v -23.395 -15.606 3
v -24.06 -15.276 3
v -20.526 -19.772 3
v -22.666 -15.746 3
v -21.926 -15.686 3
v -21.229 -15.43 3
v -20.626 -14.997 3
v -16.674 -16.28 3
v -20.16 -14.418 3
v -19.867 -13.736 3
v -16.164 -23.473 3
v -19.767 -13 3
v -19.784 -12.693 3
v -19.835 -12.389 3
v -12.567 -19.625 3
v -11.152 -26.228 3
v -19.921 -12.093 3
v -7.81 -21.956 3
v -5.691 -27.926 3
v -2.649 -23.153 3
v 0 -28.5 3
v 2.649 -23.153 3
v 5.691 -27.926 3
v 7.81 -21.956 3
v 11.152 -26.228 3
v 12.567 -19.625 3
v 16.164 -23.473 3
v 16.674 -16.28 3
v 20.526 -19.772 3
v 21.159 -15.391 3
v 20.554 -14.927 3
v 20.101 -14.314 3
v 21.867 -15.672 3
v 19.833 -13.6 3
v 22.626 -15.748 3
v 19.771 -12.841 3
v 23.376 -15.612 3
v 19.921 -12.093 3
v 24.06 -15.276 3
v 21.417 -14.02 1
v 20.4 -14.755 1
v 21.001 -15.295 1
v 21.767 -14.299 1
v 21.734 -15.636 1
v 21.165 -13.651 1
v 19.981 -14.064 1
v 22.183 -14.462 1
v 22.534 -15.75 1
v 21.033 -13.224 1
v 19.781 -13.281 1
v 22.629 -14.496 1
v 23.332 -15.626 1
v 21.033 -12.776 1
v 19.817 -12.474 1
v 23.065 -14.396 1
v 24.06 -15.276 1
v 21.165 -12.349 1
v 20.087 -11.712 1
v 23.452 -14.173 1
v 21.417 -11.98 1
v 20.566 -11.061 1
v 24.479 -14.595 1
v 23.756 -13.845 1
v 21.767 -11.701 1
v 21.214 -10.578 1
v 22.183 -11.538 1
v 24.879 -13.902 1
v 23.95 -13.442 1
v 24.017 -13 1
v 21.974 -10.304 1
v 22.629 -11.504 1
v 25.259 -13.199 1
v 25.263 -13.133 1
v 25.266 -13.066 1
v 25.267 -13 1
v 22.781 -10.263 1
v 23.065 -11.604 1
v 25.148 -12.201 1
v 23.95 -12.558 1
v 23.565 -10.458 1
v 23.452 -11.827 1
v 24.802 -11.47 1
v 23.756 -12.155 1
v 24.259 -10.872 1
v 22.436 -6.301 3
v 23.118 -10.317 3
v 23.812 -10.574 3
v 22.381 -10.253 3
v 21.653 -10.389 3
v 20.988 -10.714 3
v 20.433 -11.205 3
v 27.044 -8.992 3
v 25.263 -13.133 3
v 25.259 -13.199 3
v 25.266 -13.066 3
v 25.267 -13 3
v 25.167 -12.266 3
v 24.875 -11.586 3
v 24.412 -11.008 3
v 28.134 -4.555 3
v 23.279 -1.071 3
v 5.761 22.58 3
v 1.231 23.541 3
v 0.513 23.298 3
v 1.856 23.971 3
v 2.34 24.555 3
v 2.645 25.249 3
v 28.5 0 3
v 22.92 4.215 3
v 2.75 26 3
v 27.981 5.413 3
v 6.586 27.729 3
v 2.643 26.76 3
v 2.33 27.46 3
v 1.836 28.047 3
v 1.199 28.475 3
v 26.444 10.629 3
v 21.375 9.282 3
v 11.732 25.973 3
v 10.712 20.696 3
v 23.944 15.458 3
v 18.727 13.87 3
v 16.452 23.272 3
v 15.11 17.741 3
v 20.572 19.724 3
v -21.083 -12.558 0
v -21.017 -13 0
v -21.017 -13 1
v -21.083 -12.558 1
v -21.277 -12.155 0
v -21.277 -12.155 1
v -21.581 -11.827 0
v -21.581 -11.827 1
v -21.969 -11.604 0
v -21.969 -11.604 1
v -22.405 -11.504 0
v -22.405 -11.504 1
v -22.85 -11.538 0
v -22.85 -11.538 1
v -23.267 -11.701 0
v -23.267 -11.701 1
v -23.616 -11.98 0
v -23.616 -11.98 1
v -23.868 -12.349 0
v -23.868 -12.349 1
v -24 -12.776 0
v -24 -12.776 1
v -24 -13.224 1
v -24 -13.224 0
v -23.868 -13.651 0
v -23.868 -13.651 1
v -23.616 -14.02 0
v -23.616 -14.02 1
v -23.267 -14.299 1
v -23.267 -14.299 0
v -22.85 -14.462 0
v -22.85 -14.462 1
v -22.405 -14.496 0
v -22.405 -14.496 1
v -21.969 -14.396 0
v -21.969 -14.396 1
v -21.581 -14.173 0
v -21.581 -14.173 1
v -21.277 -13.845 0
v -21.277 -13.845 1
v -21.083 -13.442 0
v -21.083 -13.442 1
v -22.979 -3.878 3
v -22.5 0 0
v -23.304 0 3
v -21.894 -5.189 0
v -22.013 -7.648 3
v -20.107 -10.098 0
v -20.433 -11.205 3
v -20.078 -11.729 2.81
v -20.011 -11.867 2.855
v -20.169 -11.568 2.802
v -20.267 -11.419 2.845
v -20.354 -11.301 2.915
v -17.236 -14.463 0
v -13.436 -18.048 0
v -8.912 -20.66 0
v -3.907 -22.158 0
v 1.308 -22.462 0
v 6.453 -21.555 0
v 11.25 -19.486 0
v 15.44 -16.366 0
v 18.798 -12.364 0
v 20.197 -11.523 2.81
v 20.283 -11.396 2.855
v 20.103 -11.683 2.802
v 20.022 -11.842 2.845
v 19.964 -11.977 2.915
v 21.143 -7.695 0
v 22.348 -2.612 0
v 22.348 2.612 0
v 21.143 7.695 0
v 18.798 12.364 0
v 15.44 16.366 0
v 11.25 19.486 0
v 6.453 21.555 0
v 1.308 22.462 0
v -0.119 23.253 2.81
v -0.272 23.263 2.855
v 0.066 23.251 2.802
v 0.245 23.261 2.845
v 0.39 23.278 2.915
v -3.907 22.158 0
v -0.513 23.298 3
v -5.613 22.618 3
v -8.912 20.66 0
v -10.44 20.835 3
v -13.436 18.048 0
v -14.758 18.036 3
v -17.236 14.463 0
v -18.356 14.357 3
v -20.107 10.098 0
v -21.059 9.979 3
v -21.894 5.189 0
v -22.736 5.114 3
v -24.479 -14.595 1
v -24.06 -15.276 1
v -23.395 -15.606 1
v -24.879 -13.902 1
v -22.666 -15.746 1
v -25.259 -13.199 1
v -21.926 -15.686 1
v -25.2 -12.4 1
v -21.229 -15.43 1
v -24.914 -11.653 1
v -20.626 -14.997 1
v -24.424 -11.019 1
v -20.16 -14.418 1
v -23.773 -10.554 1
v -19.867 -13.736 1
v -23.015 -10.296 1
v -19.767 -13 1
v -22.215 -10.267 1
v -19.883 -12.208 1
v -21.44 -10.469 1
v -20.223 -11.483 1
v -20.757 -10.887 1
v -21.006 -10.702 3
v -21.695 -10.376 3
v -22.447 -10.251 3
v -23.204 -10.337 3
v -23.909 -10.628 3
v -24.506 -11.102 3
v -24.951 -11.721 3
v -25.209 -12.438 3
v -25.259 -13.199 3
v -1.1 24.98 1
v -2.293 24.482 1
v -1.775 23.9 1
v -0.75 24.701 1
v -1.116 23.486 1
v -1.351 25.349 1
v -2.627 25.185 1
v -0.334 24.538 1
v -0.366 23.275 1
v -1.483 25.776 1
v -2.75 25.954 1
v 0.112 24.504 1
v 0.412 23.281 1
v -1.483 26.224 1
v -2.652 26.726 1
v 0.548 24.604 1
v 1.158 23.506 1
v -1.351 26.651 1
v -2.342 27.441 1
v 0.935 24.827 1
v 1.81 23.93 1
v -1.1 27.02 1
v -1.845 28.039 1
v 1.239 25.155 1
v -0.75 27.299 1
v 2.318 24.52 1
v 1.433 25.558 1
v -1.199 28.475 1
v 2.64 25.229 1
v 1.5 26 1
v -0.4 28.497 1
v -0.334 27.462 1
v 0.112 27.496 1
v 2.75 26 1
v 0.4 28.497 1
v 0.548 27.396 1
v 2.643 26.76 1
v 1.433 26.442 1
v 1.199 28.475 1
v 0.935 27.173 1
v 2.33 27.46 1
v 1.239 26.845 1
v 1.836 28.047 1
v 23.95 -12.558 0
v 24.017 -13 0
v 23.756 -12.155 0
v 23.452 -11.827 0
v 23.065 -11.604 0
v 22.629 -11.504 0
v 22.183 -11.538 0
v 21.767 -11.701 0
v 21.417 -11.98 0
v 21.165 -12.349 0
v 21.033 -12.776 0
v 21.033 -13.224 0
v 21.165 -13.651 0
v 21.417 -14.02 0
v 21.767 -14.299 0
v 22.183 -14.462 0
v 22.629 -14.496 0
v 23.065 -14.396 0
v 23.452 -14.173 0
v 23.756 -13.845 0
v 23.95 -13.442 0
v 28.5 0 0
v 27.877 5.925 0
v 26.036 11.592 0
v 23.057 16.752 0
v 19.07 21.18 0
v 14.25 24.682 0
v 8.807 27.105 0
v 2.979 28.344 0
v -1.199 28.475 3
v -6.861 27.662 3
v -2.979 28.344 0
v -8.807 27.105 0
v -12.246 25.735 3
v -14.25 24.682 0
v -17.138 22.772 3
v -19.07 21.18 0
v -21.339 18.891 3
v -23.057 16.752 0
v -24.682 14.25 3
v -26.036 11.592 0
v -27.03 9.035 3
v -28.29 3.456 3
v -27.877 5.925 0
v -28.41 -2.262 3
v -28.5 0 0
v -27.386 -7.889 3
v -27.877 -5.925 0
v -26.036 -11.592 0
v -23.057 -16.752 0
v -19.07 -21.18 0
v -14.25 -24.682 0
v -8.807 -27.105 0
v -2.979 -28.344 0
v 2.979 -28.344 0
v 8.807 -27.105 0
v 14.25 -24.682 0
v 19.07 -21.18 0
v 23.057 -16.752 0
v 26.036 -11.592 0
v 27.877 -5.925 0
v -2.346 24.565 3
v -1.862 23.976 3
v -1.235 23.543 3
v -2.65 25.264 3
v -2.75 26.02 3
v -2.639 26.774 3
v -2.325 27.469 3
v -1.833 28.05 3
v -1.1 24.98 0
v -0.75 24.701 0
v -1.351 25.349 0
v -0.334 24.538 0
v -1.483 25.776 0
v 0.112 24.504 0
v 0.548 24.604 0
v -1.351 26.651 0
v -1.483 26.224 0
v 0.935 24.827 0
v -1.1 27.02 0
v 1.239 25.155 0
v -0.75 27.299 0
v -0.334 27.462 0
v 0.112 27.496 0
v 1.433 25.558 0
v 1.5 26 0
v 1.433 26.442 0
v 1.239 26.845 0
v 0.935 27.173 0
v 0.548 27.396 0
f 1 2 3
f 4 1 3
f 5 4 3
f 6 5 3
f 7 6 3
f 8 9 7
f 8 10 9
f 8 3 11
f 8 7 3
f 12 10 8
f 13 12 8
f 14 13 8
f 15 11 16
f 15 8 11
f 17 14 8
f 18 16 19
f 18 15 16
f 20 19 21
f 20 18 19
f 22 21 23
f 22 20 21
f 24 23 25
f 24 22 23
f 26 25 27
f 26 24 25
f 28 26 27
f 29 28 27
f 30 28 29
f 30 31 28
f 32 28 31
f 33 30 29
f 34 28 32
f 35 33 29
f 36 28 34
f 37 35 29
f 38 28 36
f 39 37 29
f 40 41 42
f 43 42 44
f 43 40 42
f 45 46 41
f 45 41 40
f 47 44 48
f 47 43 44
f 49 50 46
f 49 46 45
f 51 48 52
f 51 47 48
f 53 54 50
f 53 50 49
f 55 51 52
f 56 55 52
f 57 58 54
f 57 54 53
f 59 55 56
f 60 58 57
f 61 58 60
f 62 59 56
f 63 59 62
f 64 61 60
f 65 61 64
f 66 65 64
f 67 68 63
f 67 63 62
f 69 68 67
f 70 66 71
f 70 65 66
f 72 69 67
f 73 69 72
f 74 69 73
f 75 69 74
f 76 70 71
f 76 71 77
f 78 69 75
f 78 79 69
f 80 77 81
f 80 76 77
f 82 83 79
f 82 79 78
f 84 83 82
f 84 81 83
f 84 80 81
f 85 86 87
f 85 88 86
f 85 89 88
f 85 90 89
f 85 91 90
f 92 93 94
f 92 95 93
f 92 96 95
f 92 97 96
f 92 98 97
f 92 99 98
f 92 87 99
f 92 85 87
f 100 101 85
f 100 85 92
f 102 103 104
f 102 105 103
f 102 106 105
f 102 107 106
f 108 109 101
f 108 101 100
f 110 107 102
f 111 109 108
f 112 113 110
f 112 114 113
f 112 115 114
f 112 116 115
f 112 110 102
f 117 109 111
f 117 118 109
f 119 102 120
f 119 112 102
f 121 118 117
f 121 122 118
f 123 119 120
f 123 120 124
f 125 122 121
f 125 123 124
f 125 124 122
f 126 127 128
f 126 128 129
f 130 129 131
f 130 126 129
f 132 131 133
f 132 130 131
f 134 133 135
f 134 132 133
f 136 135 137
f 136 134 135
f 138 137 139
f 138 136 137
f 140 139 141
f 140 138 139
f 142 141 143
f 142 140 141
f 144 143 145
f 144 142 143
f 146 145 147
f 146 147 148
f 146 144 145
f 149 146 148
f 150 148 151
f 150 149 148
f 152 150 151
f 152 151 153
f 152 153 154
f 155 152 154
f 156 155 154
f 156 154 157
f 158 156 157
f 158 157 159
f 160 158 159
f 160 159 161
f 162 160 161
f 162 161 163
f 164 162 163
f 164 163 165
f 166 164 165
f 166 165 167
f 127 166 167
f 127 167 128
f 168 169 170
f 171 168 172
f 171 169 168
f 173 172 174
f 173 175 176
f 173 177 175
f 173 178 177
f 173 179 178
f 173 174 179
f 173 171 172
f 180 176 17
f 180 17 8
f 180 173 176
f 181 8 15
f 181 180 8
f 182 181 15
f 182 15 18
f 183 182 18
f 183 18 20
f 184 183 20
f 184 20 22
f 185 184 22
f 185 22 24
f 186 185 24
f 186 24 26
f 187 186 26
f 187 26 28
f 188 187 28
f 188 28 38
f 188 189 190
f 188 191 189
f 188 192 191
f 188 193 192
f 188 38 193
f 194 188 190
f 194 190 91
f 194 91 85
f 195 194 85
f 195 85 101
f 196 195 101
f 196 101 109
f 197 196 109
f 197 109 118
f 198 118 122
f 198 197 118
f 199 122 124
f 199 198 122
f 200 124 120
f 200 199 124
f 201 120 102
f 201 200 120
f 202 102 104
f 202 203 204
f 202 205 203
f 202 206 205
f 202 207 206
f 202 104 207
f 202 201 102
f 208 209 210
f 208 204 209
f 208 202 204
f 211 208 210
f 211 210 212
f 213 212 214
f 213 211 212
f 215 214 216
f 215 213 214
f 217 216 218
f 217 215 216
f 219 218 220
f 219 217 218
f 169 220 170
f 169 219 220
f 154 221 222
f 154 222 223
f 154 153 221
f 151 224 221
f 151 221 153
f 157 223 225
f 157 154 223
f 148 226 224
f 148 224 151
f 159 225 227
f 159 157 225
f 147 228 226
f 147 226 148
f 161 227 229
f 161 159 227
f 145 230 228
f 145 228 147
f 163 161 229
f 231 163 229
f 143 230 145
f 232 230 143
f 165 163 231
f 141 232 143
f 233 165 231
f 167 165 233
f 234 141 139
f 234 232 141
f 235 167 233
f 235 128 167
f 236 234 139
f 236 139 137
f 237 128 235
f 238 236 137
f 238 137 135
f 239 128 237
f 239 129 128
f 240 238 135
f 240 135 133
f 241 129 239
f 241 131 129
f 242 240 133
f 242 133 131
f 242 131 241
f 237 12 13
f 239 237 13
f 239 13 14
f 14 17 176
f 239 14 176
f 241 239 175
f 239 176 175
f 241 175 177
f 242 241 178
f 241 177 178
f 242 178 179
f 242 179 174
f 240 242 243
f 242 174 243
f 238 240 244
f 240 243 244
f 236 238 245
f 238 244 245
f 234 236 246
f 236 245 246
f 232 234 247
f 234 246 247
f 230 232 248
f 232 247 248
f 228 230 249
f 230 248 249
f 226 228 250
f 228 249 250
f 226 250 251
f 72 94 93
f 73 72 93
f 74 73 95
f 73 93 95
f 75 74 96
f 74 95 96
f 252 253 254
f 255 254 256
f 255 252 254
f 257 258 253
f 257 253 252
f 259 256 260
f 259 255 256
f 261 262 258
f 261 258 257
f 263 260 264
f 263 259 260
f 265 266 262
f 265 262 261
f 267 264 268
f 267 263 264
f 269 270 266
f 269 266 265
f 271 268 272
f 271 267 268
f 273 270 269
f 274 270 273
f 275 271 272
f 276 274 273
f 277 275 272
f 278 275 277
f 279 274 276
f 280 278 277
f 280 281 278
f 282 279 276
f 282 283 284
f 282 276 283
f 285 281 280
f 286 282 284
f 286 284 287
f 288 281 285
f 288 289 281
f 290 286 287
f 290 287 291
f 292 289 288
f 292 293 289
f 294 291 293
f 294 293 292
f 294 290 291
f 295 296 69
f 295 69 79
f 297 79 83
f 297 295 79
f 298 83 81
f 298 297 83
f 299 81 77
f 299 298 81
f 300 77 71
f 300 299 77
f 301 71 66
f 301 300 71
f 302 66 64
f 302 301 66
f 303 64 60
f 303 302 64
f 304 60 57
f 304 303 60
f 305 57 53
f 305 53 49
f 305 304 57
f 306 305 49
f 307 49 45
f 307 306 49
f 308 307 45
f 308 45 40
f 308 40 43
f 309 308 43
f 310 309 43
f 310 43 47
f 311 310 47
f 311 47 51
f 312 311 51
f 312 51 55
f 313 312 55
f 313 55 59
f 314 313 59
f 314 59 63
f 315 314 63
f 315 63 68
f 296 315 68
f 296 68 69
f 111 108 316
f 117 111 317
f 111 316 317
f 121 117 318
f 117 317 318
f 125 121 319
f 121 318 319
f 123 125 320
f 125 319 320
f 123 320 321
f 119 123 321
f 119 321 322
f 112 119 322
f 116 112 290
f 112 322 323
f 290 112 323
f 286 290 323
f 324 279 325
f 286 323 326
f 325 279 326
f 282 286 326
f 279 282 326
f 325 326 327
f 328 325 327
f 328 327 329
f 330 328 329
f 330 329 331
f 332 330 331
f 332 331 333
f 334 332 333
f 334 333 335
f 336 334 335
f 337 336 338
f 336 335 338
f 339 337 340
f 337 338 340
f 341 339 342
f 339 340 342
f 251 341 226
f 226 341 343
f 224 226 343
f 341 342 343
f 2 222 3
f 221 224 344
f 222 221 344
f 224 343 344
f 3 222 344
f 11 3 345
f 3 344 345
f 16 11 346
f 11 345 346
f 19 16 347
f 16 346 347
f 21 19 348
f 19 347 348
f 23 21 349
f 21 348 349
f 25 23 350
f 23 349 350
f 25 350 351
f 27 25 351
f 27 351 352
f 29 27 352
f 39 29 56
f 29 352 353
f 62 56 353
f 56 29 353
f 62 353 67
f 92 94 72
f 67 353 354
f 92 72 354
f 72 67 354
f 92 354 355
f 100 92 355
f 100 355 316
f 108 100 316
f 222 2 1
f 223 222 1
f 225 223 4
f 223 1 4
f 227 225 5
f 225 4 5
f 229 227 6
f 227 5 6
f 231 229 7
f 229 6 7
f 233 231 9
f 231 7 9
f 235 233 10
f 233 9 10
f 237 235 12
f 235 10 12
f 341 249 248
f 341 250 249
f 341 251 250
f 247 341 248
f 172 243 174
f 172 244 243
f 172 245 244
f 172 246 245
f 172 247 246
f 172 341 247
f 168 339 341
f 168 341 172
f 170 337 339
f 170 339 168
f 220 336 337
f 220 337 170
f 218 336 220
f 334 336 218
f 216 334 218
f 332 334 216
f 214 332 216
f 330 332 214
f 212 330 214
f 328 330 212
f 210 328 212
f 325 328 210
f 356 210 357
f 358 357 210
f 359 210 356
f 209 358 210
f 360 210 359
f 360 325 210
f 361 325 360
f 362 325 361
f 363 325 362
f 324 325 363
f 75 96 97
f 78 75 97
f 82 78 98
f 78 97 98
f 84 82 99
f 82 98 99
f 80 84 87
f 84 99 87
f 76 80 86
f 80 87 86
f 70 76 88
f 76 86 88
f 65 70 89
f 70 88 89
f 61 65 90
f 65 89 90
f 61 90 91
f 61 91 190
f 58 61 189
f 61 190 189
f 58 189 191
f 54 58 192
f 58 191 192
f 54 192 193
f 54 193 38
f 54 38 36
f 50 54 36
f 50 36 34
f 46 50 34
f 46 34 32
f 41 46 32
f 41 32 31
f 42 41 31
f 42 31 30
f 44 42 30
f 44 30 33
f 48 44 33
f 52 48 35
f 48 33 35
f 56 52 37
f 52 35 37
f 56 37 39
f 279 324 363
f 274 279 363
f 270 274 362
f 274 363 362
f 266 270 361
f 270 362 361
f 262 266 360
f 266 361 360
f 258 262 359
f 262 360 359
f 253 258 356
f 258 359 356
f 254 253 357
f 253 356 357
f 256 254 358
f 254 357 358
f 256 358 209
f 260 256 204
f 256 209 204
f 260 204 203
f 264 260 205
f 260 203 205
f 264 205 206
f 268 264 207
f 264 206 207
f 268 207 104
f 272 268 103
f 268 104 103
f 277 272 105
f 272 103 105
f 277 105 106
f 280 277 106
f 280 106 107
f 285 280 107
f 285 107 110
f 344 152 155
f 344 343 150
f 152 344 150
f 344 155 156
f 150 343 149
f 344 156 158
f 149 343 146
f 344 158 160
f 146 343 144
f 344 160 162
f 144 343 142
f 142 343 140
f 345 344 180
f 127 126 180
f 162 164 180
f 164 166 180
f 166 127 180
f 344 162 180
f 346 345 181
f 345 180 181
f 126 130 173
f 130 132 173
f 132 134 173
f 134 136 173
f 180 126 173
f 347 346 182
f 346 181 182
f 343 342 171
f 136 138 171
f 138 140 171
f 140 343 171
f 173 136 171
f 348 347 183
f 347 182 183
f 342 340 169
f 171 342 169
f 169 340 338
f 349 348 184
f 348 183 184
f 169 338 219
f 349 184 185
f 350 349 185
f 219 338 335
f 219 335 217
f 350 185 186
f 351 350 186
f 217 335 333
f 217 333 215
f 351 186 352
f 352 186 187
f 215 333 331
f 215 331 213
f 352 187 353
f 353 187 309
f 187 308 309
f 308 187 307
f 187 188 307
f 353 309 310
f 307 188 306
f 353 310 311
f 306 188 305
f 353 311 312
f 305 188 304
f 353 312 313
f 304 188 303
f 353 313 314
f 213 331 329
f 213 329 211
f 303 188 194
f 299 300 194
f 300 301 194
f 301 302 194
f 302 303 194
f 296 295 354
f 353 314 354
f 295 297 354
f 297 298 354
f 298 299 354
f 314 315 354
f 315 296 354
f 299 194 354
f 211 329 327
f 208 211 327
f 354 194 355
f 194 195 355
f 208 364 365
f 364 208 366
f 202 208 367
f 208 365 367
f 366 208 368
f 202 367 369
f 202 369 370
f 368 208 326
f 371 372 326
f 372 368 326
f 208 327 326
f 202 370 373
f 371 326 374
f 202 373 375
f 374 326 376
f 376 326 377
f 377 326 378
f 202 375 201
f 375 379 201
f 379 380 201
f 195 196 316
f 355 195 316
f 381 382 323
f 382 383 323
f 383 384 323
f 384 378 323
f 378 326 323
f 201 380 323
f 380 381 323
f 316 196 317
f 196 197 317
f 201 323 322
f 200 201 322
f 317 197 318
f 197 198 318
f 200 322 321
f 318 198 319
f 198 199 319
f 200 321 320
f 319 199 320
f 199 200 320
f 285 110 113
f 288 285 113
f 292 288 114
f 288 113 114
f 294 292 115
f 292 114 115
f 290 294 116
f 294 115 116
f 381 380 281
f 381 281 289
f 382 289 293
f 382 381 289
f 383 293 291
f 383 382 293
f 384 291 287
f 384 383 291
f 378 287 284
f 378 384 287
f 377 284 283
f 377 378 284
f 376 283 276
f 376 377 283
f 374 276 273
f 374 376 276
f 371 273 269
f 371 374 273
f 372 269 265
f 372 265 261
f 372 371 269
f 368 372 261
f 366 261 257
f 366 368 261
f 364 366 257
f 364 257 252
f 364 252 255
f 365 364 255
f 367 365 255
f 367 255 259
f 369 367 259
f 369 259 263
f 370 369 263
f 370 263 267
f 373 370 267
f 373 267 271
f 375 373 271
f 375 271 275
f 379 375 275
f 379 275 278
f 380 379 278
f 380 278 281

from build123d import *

# Parameters (mm, degrees)
F0_R     = 28.5
F0_R_2   = 1.5
F0_R_3   = 22.5
F1_DEPTH = 3
F2_R     = 1.5
F3_DEPTH = 2


with BuildPart() as f1:
    # F0 (on Top) → F1 (new body)
    with BuildSketch(Plane.XY):
        Circle(F0_R)
        with Locations((-22.5166604984, -13)):
            Circle(F0_R_2, mode=Mode.SUBTRACT)
        with Locations((22.5166604984, -13)):
            Circle(F0_R_2, mode=Mode.SUBTRACT)
        Circle(F0_R_3, mode=Mode.SUBTRACT)
        with Locations((0, 26)):
            Circle(F0_R_2, mode=Mode.SUBTRACT)
    extrude(amount=F1_DEPTH)

    # F2 (on face) → F3 (cut)
    with BuildSketch(Plane.XY.offset(3)):
        with BuildLine():
            ThreePointArc((-1.1991934148, 28.4747596154), (-1.4602599271, 23.6697337179), (2.75, 26))
            ThreePointArc((2.75, 26), (2.3302662821, 27.4602599271), (1.1991934148, 28.4747596154))
            ThreePointArc((1.1991934148, 28.4747596154), (0, 28.5), (-1.1991934148, 28.4747596154))
        make_face()
        with Locations((0, 26)):
            Circle(F2_R, mode=Mode.SUBTRACT)
        with BuildLine():
            ThreePointArc((-19.7666604984, -13), (-22.6161495504, -10.2518002386), (-25.259461901, -13.1988478464))
            ThreePointArc((-25.259461901, -13.1988478464), (-24.6817240079, -14.25), (-24.0602684862, -15.2759117689))
            ThreePointArc((-24.0602684862, -15.2759117689), (-21.2287206641, -15.429755334), (-19.7666604984, -13))
        make_face()
        with Locations((-22.5166604984, -13)):
            Circle(F2_R, mode=Mode.SUBTRACT)
        with BuildLine():
            ThreePointArc((24.0602684862, -15.2759117689), (24.6817240079, -14.25), (25.259461901, -13.1988478464))
            ThreePointArc((25.259461901, -13.1988478464), (25.2648602598, -13.099489052), (25.2666604984, -13))
            ThreePointArc((25.2666604984, -13), (20.0869051644, -11.7120601657), (24.0602684862, -15.2759117689))
        make_face()
        with Locations((22.5166604984, -13)):
            Circle(F2_R, mode=Mode.SUBTRACT)
    extrude(amount=-F3_DEPTH, mode=Mode.SUBTRACT)

    # F4 (on Front) → F5 (revolve, cut)
    with BuildSketch(Plane.XZ):
        Polygon((-23.8397459622, 5), (-22.5, 0), (-22.5, 5), align=None)
    revolve(axis=Axis((0, 0, 2.1961932071), (0, 0, 1)), mode=Mode.SUBTRACT)


solid = f1.part
